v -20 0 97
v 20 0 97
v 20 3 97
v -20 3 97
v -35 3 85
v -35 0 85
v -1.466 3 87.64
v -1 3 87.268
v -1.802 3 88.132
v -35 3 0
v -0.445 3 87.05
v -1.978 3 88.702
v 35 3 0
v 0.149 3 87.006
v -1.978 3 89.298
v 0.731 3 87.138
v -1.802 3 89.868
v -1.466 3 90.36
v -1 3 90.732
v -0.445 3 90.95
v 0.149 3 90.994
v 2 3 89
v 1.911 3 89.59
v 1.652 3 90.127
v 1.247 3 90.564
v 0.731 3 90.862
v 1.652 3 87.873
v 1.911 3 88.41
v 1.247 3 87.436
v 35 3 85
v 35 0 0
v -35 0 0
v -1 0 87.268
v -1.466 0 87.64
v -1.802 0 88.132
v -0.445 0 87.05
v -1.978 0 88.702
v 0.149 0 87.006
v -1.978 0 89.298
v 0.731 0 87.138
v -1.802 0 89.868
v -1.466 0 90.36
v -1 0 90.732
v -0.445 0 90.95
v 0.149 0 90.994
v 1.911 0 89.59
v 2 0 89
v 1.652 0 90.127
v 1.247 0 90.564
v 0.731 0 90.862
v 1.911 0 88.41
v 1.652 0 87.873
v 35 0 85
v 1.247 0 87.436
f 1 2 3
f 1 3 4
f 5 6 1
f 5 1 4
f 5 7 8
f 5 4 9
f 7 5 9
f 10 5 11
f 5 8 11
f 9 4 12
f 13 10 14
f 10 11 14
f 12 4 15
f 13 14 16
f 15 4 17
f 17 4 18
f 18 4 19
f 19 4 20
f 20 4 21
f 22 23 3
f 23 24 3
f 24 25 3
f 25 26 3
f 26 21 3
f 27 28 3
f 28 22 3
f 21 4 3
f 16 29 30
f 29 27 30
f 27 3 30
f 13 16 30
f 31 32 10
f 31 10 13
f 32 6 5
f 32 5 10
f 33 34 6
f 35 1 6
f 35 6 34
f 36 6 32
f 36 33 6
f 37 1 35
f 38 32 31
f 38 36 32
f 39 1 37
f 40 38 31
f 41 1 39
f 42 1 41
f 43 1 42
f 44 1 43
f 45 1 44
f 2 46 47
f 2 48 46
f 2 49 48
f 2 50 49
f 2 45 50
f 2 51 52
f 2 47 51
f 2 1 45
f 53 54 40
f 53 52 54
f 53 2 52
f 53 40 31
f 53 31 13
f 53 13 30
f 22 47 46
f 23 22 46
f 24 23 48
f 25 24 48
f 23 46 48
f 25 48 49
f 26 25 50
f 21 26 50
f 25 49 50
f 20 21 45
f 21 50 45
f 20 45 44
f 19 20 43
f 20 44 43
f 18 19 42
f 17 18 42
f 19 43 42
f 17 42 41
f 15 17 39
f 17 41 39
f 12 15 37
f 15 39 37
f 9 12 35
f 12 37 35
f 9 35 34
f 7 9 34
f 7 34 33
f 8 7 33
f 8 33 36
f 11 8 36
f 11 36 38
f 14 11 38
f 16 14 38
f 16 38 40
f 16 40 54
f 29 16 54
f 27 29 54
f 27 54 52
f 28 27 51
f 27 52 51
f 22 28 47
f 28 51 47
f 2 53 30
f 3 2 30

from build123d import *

# Parameters (mm, degrees)
F0_R     = 2
F1_DEPTH = 3
F2_SIZE2 = 12
F2_SIZE  = 15


with BuildPart() as f1:
    # F0 (on Front) → F1 (new body)
    with BuildSketch(Plane.XZ):
        Polygon((-35, 0), (0, 0), (35, 0), (35, 97), (0, 97), (-35, 97), align=None)
        with Locations((0, 89)):
            Circle(F0_R, mode=Mode.SUBTRACT)
    extrude(amount=-F1_DEPTH)

    # F2
    f2_edges = [f1.edges().sort_by_distance(p)[0] for p in [
        (-35, 1.5, 97),
        (35, 1.5, 97),
    ]]
    f2_side = f1.faces().sort_by_distance((0, 1.5, 97))[0]
    chamfer(f2_edges, length=F2_SIZE, length2=F2_SIZE2, reference=f2_side)


solid = f1.part
